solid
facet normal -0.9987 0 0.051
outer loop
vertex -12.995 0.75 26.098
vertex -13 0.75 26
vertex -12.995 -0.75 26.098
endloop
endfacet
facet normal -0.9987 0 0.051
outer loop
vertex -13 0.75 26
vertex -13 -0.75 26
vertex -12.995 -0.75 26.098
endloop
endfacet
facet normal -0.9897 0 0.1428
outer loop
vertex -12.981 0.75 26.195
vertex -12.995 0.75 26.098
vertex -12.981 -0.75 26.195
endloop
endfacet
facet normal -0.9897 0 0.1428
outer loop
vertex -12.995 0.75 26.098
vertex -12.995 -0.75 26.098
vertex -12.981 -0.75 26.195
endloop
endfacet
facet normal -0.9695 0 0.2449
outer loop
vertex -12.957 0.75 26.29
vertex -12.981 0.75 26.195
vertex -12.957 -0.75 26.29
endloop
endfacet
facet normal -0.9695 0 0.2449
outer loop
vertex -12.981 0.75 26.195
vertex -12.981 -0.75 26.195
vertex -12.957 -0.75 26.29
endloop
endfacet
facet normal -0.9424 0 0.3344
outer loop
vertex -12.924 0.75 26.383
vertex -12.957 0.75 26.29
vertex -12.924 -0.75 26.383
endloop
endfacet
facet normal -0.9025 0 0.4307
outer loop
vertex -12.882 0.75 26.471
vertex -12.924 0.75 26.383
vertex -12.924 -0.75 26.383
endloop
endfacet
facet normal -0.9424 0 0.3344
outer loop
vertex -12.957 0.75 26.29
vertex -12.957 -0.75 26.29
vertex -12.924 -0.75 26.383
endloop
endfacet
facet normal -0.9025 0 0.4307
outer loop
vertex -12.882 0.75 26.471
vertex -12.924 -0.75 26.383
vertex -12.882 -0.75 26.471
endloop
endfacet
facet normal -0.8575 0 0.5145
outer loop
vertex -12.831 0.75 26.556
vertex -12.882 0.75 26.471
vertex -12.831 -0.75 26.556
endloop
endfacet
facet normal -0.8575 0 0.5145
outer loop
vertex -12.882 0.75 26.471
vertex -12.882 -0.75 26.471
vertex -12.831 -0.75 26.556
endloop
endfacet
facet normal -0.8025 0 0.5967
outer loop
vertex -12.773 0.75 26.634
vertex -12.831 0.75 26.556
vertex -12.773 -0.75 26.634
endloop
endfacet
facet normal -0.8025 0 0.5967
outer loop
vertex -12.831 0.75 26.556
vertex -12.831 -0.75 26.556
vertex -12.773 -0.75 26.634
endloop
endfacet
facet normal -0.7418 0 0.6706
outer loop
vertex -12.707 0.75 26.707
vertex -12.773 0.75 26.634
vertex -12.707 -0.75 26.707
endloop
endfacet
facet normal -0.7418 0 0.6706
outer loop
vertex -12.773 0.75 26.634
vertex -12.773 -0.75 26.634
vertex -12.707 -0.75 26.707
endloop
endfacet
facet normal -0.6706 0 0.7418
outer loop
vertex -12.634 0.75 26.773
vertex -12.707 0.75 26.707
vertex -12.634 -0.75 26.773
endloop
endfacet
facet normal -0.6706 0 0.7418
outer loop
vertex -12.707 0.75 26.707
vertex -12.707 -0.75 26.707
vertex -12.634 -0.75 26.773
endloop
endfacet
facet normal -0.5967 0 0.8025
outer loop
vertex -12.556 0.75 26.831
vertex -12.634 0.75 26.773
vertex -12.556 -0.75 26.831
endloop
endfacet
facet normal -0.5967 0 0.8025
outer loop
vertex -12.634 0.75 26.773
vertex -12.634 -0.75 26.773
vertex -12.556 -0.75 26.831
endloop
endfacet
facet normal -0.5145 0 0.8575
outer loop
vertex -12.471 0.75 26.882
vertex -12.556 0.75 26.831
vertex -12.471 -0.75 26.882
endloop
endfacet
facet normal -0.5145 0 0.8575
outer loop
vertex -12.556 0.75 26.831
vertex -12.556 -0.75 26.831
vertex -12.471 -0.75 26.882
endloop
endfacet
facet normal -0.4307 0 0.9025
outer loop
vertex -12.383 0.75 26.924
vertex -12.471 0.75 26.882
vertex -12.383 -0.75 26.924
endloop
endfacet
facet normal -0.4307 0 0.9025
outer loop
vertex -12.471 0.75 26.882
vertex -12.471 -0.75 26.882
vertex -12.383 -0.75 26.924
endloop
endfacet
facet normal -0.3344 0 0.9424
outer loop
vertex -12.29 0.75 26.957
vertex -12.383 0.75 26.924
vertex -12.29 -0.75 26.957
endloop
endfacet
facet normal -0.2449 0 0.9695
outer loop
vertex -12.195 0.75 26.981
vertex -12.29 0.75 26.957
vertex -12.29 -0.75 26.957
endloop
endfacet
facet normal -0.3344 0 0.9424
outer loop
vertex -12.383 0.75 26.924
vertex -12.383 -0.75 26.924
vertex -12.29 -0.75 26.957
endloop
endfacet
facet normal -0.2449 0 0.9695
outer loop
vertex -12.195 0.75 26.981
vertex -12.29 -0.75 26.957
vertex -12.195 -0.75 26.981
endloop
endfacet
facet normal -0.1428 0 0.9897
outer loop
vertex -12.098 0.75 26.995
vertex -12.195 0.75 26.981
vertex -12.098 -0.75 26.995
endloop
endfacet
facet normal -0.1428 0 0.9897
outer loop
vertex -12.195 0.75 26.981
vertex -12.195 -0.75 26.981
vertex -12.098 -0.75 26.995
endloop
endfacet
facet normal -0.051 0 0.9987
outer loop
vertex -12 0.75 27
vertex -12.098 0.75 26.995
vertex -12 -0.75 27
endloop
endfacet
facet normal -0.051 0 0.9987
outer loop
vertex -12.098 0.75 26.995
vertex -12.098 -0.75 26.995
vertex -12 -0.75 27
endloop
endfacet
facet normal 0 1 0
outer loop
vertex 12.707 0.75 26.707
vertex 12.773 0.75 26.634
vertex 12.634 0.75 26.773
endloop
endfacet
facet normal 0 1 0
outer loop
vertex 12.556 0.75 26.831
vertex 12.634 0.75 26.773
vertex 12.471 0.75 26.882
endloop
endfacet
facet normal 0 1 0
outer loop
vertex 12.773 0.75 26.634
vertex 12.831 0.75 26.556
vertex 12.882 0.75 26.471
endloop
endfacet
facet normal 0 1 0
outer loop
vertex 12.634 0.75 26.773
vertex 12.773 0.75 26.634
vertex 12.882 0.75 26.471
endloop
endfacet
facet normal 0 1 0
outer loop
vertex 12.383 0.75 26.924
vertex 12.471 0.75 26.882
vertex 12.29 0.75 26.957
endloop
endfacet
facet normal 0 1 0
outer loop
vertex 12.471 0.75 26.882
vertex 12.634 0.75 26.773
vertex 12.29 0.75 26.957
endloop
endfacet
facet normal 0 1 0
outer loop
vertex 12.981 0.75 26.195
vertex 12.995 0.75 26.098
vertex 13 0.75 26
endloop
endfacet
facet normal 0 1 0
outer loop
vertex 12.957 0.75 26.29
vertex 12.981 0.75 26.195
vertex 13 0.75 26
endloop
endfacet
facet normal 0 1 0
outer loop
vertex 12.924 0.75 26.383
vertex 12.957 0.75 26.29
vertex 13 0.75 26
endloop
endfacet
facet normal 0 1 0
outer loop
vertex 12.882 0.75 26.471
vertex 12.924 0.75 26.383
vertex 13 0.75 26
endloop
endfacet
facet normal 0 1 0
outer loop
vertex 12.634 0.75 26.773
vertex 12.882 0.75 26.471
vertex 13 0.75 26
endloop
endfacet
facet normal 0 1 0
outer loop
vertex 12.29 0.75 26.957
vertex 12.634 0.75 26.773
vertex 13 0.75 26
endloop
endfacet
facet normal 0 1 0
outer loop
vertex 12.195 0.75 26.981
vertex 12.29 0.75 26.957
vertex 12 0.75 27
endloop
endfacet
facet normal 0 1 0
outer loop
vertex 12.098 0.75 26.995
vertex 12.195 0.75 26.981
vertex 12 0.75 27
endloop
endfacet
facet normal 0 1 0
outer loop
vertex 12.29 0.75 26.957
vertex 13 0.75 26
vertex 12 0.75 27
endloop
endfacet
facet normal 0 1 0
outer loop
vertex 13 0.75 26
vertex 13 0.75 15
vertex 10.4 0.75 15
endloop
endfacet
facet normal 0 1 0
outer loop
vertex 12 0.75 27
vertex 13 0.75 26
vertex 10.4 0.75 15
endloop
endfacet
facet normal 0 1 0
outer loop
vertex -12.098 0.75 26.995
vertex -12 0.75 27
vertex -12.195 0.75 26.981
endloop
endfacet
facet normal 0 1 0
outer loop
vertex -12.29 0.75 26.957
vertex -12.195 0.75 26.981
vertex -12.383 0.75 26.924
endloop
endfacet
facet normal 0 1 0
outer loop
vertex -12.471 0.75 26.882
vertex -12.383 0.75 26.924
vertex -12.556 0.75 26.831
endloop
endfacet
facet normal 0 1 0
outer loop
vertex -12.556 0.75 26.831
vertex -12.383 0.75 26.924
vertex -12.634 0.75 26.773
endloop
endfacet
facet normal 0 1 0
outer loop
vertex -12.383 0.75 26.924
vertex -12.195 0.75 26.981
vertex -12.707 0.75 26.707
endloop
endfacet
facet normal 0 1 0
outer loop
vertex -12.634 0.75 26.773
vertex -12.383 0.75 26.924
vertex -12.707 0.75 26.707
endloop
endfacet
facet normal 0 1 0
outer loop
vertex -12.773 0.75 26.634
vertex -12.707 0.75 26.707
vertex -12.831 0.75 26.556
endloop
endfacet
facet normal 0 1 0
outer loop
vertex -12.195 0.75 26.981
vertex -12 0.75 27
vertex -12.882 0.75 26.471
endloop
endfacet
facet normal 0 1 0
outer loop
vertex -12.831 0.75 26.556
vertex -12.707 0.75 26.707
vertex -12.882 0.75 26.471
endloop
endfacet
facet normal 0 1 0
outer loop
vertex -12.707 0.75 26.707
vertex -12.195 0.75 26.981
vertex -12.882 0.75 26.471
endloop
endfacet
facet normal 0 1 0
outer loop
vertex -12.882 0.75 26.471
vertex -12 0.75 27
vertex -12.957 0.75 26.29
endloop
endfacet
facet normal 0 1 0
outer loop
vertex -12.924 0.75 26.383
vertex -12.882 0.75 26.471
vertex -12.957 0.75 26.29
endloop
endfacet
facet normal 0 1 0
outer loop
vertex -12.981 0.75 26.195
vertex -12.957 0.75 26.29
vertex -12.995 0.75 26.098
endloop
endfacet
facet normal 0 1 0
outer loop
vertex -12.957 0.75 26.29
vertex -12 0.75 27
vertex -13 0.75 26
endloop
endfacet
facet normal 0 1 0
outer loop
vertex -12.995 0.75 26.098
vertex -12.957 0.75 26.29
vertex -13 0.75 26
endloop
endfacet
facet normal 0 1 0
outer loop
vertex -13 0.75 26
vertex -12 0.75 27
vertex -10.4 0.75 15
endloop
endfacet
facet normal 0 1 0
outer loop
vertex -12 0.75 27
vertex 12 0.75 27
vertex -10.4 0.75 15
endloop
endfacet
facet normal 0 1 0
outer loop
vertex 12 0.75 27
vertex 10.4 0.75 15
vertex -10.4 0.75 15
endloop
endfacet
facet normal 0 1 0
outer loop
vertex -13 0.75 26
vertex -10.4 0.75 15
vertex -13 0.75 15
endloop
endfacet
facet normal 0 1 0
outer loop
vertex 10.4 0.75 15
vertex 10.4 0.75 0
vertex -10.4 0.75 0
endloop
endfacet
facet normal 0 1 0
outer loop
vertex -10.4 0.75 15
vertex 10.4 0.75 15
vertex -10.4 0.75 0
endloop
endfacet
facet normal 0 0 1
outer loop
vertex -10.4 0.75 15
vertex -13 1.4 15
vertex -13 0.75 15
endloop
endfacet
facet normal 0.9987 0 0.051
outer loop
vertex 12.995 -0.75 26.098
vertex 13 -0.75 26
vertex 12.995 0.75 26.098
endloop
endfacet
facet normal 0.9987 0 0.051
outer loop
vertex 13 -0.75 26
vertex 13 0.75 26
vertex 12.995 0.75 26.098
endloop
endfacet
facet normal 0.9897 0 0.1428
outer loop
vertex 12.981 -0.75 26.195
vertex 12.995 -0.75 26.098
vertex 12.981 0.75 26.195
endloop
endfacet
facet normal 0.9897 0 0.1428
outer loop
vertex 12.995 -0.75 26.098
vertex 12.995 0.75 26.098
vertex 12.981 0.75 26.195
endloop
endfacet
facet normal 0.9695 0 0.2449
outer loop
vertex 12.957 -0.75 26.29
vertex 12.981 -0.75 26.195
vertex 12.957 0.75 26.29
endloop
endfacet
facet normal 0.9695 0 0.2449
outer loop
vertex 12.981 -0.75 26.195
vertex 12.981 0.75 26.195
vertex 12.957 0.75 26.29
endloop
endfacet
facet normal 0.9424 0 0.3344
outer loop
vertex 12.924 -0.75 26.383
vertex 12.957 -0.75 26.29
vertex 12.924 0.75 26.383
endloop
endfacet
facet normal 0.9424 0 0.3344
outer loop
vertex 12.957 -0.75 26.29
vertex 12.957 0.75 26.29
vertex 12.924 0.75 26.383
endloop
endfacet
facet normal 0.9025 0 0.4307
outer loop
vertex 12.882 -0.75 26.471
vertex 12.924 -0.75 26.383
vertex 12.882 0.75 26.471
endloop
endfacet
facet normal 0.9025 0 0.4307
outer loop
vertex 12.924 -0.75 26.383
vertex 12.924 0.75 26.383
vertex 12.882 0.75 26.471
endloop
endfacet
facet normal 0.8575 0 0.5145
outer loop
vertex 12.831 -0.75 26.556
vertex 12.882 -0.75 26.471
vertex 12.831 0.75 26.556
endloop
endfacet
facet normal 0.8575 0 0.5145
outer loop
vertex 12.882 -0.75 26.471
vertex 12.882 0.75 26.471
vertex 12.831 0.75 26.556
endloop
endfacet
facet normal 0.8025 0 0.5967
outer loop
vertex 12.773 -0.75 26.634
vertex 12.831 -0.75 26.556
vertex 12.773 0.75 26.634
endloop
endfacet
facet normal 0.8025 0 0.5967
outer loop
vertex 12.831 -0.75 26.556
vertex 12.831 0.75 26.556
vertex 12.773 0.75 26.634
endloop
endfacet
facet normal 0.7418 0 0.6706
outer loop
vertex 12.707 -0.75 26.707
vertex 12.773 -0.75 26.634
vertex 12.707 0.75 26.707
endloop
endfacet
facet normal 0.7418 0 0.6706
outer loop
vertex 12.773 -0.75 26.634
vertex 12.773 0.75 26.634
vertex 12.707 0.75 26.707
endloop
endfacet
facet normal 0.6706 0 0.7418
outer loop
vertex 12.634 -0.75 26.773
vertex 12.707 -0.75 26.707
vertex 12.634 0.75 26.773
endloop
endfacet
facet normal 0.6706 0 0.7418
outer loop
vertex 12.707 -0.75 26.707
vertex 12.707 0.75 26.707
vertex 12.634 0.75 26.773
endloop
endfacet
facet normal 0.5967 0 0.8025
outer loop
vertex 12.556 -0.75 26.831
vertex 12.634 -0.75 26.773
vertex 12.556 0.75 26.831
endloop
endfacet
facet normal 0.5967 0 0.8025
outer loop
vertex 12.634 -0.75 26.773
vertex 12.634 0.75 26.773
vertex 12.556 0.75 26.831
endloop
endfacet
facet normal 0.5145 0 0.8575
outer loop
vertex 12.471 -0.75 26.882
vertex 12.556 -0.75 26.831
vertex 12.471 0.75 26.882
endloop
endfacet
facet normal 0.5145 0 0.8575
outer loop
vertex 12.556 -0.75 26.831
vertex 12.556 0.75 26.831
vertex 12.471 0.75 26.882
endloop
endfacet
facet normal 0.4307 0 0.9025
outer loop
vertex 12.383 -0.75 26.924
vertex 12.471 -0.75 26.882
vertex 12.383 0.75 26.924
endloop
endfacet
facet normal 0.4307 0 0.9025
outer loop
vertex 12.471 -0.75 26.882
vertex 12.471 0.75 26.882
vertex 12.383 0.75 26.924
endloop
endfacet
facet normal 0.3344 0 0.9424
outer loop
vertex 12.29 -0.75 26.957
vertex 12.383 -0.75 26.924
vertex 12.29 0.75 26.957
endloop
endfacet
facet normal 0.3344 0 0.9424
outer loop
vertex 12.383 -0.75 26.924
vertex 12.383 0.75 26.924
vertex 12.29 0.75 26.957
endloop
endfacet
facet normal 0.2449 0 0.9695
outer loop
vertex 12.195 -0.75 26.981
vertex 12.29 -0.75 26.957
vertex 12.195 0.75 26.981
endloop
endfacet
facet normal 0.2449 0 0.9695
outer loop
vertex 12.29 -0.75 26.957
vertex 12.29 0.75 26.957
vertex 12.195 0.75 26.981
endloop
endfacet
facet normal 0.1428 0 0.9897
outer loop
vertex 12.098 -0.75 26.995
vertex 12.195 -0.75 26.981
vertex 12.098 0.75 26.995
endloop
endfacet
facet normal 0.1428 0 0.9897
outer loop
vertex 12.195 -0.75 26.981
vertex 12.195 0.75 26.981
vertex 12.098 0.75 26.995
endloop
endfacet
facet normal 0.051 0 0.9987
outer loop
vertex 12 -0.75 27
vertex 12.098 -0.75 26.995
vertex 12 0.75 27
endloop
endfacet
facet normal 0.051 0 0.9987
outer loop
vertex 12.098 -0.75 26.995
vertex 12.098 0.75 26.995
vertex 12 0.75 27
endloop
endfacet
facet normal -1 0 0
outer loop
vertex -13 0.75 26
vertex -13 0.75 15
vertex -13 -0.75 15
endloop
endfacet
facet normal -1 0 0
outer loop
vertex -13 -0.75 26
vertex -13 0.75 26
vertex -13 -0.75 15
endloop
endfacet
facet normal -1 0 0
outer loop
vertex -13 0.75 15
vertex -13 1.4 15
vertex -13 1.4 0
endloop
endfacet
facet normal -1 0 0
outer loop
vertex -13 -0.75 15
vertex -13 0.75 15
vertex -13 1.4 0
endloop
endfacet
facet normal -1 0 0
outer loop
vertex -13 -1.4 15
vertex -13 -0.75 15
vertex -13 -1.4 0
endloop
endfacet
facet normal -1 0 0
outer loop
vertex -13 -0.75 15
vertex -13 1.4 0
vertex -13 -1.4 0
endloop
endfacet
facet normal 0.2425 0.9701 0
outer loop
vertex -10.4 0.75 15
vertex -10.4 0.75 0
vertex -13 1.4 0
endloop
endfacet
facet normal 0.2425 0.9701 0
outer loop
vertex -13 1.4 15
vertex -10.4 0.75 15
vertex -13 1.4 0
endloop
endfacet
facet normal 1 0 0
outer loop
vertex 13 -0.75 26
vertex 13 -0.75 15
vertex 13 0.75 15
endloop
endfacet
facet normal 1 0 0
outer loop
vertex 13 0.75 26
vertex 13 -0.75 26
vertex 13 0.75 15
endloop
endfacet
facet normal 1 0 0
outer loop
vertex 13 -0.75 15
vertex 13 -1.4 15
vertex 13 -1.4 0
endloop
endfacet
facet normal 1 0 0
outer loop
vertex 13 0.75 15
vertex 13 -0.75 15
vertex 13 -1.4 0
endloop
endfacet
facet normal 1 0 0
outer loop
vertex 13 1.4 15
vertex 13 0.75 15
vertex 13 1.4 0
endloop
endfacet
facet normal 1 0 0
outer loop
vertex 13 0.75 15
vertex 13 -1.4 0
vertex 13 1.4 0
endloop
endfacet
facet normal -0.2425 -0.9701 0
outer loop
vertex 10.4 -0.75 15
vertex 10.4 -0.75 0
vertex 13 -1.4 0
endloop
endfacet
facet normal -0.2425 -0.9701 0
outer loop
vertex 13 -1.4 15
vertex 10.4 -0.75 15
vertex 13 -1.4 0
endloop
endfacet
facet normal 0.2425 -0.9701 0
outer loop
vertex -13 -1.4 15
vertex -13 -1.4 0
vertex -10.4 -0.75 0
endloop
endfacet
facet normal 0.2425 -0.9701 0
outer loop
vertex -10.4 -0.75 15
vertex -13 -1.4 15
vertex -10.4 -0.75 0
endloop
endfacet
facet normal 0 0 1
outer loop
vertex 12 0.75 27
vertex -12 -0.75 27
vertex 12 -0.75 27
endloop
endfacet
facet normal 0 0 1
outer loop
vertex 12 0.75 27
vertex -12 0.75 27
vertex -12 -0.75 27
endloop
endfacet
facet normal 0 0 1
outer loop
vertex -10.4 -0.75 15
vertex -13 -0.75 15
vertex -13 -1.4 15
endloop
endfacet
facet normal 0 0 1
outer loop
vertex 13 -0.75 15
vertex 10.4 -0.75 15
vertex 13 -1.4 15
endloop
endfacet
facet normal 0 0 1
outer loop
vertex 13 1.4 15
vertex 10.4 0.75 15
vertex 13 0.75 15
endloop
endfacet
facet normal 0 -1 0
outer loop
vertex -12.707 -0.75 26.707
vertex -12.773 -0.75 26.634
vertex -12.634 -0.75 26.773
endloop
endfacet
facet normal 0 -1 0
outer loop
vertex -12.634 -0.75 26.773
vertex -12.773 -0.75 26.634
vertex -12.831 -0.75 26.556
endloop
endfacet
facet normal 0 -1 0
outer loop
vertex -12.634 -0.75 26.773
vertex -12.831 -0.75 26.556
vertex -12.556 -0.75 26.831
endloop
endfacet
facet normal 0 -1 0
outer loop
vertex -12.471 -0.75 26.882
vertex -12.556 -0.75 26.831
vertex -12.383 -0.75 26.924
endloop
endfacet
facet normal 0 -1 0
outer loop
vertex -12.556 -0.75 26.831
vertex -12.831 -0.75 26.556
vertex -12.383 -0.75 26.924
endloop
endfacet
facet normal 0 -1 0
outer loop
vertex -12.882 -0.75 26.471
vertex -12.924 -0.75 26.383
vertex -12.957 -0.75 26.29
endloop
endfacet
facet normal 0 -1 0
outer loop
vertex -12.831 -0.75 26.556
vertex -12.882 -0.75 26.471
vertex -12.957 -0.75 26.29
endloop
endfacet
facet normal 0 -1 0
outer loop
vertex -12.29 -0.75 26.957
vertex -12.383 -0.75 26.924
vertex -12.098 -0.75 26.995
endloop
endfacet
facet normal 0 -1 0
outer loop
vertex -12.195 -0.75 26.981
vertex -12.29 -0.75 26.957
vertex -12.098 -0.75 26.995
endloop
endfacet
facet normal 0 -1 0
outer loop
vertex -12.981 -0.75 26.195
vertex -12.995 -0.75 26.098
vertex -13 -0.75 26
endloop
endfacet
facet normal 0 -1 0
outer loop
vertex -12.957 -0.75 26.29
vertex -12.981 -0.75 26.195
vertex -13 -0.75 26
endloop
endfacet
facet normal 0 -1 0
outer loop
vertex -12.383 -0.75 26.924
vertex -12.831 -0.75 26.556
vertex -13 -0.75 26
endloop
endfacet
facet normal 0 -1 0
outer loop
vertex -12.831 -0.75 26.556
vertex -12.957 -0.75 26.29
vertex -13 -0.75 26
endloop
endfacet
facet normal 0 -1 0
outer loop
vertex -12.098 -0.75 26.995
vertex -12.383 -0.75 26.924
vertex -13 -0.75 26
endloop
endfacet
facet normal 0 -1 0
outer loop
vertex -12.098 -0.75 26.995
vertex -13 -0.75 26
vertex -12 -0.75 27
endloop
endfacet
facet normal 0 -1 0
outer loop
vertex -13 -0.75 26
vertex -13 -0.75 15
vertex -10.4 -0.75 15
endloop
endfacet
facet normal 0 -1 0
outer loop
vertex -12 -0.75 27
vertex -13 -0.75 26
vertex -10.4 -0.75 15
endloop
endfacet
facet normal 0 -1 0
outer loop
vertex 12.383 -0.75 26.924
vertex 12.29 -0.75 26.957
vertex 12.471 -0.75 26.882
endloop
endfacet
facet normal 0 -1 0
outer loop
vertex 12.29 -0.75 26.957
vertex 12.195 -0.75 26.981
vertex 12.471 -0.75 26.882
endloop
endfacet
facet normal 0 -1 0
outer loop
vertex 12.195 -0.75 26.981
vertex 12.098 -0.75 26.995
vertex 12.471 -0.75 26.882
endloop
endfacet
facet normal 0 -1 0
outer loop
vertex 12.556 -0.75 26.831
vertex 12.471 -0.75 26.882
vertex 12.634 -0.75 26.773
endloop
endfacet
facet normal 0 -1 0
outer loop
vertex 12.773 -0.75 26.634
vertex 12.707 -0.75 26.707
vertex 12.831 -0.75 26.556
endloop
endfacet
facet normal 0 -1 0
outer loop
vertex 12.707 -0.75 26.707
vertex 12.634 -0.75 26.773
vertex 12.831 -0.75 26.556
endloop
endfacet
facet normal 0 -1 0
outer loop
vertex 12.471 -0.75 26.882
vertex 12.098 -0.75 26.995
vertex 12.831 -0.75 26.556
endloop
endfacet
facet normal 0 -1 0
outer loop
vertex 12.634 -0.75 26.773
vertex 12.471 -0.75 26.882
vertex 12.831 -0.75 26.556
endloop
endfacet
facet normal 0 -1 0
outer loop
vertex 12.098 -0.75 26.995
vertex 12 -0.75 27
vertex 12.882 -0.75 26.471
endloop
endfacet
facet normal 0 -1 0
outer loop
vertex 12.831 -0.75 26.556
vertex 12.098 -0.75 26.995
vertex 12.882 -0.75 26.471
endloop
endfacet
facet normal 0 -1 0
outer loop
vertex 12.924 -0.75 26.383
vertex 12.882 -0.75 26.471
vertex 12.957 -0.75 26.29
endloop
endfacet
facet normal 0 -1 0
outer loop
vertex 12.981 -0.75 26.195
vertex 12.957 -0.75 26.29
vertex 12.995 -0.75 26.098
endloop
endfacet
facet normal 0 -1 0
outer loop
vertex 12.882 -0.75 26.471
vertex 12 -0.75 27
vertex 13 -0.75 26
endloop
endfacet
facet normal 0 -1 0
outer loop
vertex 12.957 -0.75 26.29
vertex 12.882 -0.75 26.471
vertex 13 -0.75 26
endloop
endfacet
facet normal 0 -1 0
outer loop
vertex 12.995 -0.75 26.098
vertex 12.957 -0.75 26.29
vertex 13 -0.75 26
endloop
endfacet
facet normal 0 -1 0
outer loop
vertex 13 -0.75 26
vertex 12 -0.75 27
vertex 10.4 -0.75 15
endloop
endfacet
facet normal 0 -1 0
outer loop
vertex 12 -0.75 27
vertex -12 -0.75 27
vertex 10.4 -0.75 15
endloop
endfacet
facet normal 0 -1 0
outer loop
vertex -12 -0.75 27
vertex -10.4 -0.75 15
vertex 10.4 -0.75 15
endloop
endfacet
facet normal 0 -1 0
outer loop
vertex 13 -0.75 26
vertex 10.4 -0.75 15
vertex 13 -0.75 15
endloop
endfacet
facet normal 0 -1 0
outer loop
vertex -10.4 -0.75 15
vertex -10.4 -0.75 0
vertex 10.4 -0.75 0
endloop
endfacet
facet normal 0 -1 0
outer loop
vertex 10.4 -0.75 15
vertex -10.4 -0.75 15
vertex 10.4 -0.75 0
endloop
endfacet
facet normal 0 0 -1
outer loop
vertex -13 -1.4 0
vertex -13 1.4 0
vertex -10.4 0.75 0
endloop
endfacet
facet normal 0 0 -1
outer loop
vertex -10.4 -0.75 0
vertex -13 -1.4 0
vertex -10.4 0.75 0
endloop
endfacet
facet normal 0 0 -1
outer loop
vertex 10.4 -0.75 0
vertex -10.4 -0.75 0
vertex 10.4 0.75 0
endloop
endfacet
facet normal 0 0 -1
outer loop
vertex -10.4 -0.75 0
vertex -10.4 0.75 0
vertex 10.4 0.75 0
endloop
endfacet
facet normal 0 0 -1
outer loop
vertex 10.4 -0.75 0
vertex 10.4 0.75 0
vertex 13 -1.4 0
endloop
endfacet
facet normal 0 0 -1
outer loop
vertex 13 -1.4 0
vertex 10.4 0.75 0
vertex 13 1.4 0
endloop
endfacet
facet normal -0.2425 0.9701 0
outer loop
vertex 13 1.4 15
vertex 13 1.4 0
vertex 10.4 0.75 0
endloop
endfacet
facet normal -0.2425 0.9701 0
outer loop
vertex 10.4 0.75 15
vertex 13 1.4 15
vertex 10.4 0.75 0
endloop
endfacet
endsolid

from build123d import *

# Parameters (mm, degrees)
F1_DEPTH = 27
F2_DEPTH = 15
F3_R     = 1


with BuildPart() as f1:
    # F0 (on Top) → F1 (new body)
    with BuildSketch(Plane.XY):
        Polygon((-10.4, 0.75), (-13, 0.75), (-13, -0.75), (-10.4, -0.75), (10.4, -0.75), (13, -0.75), (13, 0.75), (10.4, 0.75), align=None)
    extrude(amount=F1_DEPTH)

    # F0 (on Top) → F2 (join)
    with BuildSketch(Plane.XY):
        Polygon((-13, 1.4), (-13, 0.75), (-10.4, 0.75), align=None)
        Polygon((-10.4, -0.75), (-13, -0.75), (-13, -1.4), align=None)
        Polygon((13, 1.4), (10.4, 0.75), (13, 0.75), align=None)
        Polygon((13, -0.75), (10.4, -0.75), (13, -1.4), align=None)
    extrude(amount=F2_DEPTH)

    # F3
    f3_edges = [f1.edges().sort_by_distance(p)[0] for p in [
        (-13, 0, 27),
        (13, 0, 27),
    ]]
    fillet(f3_edges, radius=F3_R)


solid = f1.part
